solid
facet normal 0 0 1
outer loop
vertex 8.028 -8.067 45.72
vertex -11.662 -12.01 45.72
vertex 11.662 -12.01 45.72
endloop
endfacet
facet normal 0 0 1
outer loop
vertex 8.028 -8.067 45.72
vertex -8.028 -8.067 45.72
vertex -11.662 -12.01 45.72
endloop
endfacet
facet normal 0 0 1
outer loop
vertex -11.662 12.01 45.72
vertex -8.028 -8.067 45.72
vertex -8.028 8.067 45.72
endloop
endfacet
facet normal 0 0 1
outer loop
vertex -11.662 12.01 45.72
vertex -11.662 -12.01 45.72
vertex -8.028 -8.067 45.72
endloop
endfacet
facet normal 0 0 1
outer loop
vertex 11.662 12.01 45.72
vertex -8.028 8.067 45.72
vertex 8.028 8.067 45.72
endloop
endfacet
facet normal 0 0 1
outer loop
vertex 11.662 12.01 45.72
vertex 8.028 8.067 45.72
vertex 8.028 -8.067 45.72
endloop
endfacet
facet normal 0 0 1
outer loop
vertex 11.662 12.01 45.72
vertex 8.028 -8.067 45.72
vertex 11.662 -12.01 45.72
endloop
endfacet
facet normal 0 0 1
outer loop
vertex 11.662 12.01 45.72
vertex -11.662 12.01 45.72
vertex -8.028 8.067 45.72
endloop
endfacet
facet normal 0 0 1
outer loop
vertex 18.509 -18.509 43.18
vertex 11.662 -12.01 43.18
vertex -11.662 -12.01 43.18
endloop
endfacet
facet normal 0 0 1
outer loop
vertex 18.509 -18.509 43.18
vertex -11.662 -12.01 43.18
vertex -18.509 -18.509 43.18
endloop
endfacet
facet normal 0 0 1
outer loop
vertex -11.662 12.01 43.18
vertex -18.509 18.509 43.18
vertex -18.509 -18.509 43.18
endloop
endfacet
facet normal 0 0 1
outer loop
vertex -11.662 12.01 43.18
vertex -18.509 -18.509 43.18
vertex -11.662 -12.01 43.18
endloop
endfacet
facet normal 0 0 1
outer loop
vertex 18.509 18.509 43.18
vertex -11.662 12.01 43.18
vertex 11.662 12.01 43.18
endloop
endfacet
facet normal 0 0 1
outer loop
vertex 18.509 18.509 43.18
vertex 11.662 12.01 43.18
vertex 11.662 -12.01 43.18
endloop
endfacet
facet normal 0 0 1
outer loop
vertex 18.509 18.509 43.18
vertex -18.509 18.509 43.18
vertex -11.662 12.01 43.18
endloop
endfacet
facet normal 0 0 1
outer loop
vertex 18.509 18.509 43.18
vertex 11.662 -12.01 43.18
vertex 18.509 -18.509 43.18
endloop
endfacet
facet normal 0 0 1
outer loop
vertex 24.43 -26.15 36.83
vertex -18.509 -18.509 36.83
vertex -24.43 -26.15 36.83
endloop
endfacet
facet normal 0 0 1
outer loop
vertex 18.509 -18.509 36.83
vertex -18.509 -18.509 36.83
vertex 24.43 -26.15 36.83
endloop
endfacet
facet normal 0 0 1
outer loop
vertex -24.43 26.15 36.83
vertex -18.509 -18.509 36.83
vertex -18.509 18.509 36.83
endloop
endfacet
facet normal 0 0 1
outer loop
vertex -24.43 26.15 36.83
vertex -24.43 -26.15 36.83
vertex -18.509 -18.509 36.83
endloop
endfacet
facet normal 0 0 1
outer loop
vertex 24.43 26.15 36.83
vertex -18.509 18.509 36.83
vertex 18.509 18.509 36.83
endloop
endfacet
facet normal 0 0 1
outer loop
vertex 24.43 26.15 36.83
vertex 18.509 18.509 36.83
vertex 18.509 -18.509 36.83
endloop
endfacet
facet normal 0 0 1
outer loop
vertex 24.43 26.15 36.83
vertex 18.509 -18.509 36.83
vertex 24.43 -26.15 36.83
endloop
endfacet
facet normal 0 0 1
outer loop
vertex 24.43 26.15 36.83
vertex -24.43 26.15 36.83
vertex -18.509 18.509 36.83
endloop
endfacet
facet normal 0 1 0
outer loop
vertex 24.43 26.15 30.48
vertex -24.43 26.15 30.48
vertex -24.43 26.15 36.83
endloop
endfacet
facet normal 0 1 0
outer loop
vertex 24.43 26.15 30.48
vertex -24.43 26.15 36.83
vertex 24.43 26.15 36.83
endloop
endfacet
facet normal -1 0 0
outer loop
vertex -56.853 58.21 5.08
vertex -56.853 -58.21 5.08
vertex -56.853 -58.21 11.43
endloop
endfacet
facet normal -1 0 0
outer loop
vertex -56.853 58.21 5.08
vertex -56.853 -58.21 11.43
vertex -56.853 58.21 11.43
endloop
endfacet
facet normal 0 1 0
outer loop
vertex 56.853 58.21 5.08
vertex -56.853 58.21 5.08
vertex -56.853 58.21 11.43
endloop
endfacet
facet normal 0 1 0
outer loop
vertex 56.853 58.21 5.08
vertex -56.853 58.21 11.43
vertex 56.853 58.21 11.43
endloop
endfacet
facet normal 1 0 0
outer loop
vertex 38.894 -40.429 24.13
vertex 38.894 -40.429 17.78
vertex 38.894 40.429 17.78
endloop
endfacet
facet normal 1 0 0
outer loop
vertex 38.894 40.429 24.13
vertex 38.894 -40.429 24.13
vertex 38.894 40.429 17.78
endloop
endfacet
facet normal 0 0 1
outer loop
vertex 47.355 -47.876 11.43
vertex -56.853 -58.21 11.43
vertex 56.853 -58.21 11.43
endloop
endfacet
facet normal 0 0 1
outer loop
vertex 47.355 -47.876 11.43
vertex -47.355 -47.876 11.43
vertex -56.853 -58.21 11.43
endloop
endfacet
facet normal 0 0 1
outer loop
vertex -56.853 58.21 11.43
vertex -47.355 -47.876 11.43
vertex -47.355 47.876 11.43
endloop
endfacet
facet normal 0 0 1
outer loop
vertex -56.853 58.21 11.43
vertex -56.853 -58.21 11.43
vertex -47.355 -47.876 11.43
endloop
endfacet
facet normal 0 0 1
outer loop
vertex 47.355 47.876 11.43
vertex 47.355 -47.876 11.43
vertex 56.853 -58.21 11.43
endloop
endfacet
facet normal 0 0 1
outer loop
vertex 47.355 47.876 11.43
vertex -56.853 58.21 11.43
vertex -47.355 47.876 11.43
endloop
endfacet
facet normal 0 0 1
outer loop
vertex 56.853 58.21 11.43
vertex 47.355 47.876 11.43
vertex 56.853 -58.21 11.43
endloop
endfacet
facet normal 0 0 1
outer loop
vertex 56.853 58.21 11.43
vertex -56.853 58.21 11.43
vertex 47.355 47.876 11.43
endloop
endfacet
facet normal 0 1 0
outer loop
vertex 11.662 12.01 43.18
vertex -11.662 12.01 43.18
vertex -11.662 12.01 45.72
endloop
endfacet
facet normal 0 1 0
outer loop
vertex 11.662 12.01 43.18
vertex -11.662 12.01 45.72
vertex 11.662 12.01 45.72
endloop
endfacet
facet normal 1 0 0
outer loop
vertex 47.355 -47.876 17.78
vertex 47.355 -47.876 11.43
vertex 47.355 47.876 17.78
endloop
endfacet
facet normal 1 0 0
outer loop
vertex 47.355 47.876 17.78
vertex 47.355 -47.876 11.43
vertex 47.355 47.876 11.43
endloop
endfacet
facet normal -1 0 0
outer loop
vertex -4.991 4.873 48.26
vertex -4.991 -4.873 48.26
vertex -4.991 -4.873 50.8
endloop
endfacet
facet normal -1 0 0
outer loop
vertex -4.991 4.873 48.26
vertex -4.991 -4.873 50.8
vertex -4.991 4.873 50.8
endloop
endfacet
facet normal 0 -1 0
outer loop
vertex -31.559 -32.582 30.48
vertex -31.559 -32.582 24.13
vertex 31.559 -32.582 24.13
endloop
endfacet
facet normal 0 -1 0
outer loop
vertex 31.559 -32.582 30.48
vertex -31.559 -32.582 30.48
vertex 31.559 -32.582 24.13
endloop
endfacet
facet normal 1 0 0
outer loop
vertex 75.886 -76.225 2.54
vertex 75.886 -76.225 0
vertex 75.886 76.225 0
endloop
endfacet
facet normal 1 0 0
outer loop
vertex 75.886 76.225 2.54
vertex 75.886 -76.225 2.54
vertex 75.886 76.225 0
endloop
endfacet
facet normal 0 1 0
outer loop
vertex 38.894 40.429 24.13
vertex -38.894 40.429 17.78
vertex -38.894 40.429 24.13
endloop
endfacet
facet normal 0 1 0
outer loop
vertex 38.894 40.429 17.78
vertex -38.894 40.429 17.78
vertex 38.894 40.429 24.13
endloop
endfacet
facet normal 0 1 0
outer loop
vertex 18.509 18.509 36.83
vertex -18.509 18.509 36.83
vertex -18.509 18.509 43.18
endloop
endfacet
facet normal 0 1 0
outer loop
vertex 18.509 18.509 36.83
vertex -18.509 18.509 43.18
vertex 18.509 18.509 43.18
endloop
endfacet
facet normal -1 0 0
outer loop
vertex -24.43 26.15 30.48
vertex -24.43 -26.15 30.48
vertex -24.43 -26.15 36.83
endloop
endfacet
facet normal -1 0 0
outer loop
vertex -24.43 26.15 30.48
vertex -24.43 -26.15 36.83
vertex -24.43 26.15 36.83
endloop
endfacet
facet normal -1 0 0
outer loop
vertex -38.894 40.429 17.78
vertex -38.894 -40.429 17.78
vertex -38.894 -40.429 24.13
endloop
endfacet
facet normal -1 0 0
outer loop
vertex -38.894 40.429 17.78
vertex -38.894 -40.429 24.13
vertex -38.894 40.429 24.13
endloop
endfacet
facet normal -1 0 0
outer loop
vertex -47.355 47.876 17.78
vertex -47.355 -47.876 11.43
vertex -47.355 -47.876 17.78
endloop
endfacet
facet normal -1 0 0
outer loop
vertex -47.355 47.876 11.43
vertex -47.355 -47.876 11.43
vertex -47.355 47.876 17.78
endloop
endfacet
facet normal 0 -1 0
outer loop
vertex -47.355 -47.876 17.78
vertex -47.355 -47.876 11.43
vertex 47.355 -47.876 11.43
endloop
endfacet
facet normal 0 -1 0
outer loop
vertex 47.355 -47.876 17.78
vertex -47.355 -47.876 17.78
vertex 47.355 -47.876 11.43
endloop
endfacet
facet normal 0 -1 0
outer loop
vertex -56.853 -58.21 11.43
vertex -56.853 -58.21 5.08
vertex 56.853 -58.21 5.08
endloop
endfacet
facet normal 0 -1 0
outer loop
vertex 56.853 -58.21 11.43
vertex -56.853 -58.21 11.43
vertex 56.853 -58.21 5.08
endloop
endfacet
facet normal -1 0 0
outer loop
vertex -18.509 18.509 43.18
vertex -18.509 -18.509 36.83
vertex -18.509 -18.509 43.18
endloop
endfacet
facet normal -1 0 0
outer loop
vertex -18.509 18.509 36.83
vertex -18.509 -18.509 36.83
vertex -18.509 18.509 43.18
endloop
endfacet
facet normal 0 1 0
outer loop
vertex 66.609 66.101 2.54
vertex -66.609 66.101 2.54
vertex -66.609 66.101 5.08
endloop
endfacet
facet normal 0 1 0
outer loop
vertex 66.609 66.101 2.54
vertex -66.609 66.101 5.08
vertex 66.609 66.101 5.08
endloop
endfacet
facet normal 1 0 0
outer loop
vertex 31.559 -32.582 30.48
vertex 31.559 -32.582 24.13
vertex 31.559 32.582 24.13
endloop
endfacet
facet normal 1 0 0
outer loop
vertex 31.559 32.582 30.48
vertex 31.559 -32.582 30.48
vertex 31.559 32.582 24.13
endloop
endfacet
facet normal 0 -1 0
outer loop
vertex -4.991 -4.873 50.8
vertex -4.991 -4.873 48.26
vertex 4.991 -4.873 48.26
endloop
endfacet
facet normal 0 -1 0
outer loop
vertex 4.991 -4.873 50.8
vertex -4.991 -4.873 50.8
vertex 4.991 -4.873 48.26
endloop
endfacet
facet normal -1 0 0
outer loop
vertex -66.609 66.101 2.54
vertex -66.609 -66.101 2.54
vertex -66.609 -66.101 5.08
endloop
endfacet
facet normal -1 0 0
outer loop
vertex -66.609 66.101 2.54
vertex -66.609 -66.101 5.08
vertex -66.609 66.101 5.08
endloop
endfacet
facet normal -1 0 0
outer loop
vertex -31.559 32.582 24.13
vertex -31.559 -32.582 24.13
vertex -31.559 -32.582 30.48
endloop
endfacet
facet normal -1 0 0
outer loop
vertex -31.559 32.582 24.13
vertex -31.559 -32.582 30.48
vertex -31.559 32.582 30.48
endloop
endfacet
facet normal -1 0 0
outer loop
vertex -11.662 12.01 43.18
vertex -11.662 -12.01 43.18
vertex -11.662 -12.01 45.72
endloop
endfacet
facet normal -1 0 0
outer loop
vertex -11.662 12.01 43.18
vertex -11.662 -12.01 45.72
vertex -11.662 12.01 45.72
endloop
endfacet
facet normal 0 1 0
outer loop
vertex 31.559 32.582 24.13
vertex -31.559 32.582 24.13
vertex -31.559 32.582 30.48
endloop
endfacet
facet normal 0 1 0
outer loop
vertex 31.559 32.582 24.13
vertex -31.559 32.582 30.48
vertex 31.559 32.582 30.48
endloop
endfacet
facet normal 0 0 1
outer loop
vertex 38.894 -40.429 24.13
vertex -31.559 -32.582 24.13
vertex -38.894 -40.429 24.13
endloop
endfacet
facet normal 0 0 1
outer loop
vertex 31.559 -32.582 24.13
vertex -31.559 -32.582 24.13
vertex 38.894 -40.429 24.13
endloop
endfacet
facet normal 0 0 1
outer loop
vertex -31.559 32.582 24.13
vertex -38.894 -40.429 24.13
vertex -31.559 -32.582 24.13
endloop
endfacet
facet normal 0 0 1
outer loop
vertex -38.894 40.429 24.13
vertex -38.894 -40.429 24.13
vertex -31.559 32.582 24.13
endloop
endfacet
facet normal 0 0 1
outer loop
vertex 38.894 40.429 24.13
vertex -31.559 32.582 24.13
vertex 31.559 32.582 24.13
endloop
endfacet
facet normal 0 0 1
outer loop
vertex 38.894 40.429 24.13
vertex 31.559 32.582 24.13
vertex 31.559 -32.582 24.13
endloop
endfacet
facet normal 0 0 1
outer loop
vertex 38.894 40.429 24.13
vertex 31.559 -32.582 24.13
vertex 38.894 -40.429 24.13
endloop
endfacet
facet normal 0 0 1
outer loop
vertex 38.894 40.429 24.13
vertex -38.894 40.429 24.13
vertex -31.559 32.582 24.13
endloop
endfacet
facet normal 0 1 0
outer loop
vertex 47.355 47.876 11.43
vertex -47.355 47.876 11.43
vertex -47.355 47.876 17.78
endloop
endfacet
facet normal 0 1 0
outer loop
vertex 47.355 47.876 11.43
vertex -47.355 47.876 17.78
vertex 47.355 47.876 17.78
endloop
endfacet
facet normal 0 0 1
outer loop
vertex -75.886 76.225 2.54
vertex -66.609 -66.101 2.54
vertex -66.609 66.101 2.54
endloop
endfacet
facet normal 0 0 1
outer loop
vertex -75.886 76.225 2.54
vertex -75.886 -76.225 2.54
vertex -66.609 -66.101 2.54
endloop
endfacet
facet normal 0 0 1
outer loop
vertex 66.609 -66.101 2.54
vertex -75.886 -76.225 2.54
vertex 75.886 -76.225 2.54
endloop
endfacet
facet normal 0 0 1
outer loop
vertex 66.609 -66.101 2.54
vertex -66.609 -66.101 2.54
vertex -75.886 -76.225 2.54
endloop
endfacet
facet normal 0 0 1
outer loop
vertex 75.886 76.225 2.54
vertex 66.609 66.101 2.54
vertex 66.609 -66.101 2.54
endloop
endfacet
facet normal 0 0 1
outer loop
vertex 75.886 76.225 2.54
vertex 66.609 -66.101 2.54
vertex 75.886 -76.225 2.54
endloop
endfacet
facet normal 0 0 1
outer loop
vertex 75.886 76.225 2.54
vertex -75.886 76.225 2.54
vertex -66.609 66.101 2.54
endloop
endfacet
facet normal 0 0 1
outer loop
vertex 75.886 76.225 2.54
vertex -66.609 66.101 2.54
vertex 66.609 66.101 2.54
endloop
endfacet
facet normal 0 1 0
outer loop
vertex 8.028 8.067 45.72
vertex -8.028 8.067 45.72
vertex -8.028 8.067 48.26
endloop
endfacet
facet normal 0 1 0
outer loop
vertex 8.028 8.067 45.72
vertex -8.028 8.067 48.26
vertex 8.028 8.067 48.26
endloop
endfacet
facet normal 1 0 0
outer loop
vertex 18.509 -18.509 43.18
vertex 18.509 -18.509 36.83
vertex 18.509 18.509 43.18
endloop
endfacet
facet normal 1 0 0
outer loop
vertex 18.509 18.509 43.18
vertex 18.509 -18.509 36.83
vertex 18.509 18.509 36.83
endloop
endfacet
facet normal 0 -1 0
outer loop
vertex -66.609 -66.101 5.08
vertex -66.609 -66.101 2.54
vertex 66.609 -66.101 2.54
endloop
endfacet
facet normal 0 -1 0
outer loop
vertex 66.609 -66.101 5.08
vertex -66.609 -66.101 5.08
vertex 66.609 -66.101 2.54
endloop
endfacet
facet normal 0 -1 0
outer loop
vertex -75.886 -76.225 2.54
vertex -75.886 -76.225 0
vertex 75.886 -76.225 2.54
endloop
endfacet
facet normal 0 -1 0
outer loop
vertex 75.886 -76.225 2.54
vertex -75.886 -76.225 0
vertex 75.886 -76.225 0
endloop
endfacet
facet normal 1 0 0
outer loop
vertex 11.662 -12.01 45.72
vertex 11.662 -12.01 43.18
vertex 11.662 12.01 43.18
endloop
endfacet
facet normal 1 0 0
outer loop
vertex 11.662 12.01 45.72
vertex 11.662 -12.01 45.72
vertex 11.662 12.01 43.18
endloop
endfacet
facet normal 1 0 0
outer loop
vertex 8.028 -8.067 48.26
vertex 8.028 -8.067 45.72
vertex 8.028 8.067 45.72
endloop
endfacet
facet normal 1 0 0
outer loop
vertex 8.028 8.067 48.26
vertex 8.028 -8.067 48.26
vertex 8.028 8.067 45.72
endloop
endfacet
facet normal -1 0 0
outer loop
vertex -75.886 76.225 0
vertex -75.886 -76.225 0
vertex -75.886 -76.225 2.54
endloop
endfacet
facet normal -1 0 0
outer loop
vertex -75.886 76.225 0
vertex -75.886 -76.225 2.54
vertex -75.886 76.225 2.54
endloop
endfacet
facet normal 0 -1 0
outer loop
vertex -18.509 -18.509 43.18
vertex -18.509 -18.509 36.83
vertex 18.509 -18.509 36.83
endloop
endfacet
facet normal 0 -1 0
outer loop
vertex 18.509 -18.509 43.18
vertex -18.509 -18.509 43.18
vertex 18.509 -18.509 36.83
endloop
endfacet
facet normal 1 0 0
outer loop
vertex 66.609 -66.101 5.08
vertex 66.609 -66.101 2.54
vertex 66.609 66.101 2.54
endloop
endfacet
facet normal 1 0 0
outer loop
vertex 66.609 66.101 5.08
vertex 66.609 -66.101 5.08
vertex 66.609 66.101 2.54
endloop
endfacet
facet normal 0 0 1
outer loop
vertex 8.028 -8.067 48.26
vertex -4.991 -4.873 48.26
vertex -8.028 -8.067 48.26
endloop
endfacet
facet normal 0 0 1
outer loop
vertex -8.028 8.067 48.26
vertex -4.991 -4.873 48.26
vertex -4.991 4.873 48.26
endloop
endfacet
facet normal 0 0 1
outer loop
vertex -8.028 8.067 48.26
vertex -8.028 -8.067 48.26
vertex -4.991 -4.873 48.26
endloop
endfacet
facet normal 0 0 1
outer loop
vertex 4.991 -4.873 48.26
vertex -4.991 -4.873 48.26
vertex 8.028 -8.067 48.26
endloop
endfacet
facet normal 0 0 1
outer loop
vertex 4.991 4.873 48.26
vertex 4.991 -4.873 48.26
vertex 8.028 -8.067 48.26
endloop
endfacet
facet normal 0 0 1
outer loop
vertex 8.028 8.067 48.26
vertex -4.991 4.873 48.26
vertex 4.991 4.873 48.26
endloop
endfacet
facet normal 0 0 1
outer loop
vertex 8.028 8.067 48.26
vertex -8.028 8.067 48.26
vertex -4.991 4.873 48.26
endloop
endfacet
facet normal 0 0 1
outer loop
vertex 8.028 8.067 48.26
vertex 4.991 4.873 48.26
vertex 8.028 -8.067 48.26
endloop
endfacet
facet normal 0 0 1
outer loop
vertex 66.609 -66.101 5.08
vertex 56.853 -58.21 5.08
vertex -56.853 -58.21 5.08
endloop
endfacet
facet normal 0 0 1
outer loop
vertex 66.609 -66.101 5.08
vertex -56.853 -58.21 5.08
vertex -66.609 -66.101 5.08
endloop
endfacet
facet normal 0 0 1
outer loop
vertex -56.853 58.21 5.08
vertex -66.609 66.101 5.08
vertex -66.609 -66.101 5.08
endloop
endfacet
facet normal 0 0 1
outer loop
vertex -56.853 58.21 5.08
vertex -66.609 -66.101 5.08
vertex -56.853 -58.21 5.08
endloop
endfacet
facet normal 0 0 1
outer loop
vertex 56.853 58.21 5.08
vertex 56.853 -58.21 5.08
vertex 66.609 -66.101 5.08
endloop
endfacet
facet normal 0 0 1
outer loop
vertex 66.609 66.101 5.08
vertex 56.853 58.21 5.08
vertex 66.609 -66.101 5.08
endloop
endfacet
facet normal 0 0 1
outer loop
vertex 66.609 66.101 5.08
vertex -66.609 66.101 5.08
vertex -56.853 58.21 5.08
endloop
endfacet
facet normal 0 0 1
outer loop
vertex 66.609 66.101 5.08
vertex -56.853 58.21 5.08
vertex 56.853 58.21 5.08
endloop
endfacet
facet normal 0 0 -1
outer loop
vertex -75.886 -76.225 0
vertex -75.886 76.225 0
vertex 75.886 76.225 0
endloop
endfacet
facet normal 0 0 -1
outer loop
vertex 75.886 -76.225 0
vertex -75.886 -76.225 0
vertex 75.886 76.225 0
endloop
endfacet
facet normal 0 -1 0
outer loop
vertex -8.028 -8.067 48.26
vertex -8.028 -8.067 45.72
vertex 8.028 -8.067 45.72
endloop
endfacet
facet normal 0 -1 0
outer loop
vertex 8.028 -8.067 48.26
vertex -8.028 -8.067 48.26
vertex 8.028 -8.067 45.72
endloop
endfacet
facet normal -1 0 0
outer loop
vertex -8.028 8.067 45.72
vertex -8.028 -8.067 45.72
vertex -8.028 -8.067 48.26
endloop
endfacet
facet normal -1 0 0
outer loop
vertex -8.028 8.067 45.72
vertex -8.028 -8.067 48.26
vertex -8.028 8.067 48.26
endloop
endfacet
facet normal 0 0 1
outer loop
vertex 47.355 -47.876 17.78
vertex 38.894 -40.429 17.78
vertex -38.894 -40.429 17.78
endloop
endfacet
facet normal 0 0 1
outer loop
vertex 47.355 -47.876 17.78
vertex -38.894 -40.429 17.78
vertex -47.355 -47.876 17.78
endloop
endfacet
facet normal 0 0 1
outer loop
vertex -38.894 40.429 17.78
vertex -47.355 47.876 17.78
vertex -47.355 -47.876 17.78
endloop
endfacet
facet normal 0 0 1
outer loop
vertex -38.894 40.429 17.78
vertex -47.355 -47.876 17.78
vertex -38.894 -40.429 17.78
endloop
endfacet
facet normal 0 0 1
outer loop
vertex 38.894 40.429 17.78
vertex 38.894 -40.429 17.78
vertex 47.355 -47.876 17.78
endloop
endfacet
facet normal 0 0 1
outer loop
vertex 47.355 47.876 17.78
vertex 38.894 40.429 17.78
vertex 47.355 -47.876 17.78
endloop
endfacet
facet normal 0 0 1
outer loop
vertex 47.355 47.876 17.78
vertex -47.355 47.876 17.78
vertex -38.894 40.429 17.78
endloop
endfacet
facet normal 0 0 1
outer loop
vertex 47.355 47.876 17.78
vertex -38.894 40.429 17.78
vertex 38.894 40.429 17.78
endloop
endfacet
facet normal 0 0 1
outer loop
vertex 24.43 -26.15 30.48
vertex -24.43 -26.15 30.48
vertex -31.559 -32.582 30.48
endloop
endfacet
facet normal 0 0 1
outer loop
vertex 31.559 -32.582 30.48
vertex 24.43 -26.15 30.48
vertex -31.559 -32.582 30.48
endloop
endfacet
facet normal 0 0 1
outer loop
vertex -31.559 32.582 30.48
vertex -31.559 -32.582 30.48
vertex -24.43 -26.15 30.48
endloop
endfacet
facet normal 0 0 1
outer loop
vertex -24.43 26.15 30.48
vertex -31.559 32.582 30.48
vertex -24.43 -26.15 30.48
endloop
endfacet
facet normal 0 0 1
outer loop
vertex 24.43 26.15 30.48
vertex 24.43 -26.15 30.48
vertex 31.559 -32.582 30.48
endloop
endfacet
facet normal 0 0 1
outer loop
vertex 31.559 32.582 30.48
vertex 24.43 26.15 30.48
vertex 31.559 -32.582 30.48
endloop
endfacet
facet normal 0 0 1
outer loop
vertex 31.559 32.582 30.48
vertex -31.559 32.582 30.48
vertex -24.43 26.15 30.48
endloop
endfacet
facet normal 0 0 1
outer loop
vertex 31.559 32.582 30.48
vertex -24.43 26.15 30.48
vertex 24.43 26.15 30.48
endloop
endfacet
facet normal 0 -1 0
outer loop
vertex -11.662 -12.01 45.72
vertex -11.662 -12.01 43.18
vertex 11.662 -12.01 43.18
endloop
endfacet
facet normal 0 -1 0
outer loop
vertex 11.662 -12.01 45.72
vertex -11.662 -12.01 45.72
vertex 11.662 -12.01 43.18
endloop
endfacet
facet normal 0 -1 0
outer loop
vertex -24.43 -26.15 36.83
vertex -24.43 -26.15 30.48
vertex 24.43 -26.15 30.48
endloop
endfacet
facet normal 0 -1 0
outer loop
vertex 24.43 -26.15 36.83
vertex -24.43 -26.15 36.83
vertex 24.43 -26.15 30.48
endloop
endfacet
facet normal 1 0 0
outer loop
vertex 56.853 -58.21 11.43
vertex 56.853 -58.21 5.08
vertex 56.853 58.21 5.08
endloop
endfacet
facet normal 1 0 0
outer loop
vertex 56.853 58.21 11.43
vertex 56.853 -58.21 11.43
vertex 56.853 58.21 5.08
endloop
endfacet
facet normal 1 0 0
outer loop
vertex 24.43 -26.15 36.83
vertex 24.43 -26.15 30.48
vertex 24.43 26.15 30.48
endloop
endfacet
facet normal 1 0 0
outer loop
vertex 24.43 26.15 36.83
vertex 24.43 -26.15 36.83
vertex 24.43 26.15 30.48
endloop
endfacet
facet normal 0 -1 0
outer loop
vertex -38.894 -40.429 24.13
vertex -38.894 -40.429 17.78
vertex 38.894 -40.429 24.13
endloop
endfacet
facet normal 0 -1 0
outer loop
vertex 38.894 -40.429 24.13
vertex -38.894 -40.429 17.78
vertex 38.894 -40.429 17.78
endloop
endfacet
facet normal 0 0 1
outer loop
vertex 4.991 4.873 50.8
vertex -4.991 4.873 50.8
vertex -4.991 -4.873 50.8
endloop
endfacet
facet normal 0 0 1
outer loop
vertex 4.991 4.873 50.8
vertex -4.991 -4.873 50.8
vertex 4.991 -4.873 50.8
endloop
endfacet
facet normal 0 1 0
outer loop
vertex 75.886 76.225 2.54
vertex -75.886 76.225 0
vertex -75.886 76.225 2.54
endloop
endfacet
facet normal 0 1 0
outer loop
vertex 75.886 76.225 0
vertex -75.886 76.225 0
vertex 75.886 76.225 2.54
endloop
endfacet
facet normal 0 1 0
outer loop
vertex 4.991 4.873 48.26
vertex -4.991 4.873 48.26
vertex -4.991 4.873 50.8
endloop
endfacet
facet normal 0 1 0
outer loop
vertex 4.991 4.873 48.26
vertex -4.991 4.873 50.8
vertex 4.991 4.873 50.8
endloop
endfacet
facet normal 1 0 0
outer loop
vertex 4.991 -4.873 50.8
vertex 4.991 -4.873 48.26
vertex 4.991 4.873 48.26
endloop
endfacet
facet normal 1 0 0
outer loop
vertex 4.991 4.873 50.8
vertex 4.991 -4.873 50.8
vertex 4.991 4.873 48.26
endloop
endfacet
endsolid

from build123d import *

# Parameters (mm, degrees)
F0_W      = 151.771664
F0_H      = 152.44925
F1_DEPTH  = 2.54
F2_W      = 133.218258
F2_H      = 132.201344
F3_DEPTH  = 2.54
F4_W      = 113.705158
F4_H      = 116.420522
F5_DEPTH  = 6.35
F6_W      = 94.709642
F6_H      = 95.752604
F7_DEPTH  = 6.35
F8_W      = 77.787876
F8_H      = 80.85847
F9_DEPTH  = 6.35
F10_W     = 63.117356
F10_H     = 65.164418
F11_DEPTH = 6.35
F12_W     = 48.859716
F12_H     = 52.300558
F13_DEPTH = 6.35
F14_W     = 37.017644
F14_H     = 37.017658
F15_DEPTH = 6.35
F16_W     = 23.323506
F16_H     = 24.019762
F17_DEPTH = 2.54
F18_W     = 16.055972
F18_H     = 16.134798
F19_DEPTH = 2.54
F20_W     = 9.981216
F20_H     = 9.746186
F21_DEPTH = 2.54


with BuildPart() as f1:
    # F0 (on Top) → F1 (new body)
    with BuildSketch(Plane.XY):
        Rectangle(F0_W, F0_H)
    extrude(amount=F1_DEPTH)

    # F2 (on face) → F3 (join)
    with BuildSketch(Plane.XY.offset(2.54)):
        Rectangle(F2_W, F2_H)
    extrude(amount=F3_DEPTH)

    # F4 (on face) → F5 (join)
    with BuildSketch(Plane.XY.offset(5.08)):
        Rectangle(F4_W, F4_H)
    extrude(amount=F5_DEPTH)

    # F6 (on face) → F7 (join)
    with BuildSketch(Plane.XY.offset(11.43)):
        Rectangle(F6_W, F6_H)
    extrude(amount=F7_DEPTH)

    # F8 (on face) → F9 (join)
    with BuildSketch(Plane.XY.offset(17.78)):
        Rectangle(F8_W, F8_H)
    extrude(amount=F9_DEPTH)

    # F10 (on face) → F11 (join)
    with BuildSketch(Plane.XY.offset(24.13)):
        Rectangle(F10_W, F10_H)
    extrude(amount=F11_DEPTH)

    # F12 (on face) → F13 (join)
    with BuildSketch(Plane.XY.offset(30.48)):
        Rectangle(F12_W, F12_H)
    extrude(amount=F13_DEPTH)

    # F14 (on face) → F15 (join)
    with BuildSketch(Plane.XY.offset(36.83)):
        Rectangle(F14_W, F14_H)
    extrude(amount=F15_DEPTH)

    # F16 (on face) → F17 (join)
    with BuildSketch(Plane.XY.offset(43.18)):
        Rectangle(F16_W, F16_H)
    extrude(amount=F17_DEPTH)

    # F18 (on face) → F19 (join)
    with BuildSketch(Plane.XY.offset(45.72)):
        Rectangle(F18_W, F18_H)
    extrude(amount=F19_DEPTH)

    # F20 (on face) → F21 (join)
    with BuildSketch(Plane.XY.offset(48.26)):
        Rectangle(F20_W, F20_H)
    extrude(amount=F21_DEPTH)


solid = f1.part
